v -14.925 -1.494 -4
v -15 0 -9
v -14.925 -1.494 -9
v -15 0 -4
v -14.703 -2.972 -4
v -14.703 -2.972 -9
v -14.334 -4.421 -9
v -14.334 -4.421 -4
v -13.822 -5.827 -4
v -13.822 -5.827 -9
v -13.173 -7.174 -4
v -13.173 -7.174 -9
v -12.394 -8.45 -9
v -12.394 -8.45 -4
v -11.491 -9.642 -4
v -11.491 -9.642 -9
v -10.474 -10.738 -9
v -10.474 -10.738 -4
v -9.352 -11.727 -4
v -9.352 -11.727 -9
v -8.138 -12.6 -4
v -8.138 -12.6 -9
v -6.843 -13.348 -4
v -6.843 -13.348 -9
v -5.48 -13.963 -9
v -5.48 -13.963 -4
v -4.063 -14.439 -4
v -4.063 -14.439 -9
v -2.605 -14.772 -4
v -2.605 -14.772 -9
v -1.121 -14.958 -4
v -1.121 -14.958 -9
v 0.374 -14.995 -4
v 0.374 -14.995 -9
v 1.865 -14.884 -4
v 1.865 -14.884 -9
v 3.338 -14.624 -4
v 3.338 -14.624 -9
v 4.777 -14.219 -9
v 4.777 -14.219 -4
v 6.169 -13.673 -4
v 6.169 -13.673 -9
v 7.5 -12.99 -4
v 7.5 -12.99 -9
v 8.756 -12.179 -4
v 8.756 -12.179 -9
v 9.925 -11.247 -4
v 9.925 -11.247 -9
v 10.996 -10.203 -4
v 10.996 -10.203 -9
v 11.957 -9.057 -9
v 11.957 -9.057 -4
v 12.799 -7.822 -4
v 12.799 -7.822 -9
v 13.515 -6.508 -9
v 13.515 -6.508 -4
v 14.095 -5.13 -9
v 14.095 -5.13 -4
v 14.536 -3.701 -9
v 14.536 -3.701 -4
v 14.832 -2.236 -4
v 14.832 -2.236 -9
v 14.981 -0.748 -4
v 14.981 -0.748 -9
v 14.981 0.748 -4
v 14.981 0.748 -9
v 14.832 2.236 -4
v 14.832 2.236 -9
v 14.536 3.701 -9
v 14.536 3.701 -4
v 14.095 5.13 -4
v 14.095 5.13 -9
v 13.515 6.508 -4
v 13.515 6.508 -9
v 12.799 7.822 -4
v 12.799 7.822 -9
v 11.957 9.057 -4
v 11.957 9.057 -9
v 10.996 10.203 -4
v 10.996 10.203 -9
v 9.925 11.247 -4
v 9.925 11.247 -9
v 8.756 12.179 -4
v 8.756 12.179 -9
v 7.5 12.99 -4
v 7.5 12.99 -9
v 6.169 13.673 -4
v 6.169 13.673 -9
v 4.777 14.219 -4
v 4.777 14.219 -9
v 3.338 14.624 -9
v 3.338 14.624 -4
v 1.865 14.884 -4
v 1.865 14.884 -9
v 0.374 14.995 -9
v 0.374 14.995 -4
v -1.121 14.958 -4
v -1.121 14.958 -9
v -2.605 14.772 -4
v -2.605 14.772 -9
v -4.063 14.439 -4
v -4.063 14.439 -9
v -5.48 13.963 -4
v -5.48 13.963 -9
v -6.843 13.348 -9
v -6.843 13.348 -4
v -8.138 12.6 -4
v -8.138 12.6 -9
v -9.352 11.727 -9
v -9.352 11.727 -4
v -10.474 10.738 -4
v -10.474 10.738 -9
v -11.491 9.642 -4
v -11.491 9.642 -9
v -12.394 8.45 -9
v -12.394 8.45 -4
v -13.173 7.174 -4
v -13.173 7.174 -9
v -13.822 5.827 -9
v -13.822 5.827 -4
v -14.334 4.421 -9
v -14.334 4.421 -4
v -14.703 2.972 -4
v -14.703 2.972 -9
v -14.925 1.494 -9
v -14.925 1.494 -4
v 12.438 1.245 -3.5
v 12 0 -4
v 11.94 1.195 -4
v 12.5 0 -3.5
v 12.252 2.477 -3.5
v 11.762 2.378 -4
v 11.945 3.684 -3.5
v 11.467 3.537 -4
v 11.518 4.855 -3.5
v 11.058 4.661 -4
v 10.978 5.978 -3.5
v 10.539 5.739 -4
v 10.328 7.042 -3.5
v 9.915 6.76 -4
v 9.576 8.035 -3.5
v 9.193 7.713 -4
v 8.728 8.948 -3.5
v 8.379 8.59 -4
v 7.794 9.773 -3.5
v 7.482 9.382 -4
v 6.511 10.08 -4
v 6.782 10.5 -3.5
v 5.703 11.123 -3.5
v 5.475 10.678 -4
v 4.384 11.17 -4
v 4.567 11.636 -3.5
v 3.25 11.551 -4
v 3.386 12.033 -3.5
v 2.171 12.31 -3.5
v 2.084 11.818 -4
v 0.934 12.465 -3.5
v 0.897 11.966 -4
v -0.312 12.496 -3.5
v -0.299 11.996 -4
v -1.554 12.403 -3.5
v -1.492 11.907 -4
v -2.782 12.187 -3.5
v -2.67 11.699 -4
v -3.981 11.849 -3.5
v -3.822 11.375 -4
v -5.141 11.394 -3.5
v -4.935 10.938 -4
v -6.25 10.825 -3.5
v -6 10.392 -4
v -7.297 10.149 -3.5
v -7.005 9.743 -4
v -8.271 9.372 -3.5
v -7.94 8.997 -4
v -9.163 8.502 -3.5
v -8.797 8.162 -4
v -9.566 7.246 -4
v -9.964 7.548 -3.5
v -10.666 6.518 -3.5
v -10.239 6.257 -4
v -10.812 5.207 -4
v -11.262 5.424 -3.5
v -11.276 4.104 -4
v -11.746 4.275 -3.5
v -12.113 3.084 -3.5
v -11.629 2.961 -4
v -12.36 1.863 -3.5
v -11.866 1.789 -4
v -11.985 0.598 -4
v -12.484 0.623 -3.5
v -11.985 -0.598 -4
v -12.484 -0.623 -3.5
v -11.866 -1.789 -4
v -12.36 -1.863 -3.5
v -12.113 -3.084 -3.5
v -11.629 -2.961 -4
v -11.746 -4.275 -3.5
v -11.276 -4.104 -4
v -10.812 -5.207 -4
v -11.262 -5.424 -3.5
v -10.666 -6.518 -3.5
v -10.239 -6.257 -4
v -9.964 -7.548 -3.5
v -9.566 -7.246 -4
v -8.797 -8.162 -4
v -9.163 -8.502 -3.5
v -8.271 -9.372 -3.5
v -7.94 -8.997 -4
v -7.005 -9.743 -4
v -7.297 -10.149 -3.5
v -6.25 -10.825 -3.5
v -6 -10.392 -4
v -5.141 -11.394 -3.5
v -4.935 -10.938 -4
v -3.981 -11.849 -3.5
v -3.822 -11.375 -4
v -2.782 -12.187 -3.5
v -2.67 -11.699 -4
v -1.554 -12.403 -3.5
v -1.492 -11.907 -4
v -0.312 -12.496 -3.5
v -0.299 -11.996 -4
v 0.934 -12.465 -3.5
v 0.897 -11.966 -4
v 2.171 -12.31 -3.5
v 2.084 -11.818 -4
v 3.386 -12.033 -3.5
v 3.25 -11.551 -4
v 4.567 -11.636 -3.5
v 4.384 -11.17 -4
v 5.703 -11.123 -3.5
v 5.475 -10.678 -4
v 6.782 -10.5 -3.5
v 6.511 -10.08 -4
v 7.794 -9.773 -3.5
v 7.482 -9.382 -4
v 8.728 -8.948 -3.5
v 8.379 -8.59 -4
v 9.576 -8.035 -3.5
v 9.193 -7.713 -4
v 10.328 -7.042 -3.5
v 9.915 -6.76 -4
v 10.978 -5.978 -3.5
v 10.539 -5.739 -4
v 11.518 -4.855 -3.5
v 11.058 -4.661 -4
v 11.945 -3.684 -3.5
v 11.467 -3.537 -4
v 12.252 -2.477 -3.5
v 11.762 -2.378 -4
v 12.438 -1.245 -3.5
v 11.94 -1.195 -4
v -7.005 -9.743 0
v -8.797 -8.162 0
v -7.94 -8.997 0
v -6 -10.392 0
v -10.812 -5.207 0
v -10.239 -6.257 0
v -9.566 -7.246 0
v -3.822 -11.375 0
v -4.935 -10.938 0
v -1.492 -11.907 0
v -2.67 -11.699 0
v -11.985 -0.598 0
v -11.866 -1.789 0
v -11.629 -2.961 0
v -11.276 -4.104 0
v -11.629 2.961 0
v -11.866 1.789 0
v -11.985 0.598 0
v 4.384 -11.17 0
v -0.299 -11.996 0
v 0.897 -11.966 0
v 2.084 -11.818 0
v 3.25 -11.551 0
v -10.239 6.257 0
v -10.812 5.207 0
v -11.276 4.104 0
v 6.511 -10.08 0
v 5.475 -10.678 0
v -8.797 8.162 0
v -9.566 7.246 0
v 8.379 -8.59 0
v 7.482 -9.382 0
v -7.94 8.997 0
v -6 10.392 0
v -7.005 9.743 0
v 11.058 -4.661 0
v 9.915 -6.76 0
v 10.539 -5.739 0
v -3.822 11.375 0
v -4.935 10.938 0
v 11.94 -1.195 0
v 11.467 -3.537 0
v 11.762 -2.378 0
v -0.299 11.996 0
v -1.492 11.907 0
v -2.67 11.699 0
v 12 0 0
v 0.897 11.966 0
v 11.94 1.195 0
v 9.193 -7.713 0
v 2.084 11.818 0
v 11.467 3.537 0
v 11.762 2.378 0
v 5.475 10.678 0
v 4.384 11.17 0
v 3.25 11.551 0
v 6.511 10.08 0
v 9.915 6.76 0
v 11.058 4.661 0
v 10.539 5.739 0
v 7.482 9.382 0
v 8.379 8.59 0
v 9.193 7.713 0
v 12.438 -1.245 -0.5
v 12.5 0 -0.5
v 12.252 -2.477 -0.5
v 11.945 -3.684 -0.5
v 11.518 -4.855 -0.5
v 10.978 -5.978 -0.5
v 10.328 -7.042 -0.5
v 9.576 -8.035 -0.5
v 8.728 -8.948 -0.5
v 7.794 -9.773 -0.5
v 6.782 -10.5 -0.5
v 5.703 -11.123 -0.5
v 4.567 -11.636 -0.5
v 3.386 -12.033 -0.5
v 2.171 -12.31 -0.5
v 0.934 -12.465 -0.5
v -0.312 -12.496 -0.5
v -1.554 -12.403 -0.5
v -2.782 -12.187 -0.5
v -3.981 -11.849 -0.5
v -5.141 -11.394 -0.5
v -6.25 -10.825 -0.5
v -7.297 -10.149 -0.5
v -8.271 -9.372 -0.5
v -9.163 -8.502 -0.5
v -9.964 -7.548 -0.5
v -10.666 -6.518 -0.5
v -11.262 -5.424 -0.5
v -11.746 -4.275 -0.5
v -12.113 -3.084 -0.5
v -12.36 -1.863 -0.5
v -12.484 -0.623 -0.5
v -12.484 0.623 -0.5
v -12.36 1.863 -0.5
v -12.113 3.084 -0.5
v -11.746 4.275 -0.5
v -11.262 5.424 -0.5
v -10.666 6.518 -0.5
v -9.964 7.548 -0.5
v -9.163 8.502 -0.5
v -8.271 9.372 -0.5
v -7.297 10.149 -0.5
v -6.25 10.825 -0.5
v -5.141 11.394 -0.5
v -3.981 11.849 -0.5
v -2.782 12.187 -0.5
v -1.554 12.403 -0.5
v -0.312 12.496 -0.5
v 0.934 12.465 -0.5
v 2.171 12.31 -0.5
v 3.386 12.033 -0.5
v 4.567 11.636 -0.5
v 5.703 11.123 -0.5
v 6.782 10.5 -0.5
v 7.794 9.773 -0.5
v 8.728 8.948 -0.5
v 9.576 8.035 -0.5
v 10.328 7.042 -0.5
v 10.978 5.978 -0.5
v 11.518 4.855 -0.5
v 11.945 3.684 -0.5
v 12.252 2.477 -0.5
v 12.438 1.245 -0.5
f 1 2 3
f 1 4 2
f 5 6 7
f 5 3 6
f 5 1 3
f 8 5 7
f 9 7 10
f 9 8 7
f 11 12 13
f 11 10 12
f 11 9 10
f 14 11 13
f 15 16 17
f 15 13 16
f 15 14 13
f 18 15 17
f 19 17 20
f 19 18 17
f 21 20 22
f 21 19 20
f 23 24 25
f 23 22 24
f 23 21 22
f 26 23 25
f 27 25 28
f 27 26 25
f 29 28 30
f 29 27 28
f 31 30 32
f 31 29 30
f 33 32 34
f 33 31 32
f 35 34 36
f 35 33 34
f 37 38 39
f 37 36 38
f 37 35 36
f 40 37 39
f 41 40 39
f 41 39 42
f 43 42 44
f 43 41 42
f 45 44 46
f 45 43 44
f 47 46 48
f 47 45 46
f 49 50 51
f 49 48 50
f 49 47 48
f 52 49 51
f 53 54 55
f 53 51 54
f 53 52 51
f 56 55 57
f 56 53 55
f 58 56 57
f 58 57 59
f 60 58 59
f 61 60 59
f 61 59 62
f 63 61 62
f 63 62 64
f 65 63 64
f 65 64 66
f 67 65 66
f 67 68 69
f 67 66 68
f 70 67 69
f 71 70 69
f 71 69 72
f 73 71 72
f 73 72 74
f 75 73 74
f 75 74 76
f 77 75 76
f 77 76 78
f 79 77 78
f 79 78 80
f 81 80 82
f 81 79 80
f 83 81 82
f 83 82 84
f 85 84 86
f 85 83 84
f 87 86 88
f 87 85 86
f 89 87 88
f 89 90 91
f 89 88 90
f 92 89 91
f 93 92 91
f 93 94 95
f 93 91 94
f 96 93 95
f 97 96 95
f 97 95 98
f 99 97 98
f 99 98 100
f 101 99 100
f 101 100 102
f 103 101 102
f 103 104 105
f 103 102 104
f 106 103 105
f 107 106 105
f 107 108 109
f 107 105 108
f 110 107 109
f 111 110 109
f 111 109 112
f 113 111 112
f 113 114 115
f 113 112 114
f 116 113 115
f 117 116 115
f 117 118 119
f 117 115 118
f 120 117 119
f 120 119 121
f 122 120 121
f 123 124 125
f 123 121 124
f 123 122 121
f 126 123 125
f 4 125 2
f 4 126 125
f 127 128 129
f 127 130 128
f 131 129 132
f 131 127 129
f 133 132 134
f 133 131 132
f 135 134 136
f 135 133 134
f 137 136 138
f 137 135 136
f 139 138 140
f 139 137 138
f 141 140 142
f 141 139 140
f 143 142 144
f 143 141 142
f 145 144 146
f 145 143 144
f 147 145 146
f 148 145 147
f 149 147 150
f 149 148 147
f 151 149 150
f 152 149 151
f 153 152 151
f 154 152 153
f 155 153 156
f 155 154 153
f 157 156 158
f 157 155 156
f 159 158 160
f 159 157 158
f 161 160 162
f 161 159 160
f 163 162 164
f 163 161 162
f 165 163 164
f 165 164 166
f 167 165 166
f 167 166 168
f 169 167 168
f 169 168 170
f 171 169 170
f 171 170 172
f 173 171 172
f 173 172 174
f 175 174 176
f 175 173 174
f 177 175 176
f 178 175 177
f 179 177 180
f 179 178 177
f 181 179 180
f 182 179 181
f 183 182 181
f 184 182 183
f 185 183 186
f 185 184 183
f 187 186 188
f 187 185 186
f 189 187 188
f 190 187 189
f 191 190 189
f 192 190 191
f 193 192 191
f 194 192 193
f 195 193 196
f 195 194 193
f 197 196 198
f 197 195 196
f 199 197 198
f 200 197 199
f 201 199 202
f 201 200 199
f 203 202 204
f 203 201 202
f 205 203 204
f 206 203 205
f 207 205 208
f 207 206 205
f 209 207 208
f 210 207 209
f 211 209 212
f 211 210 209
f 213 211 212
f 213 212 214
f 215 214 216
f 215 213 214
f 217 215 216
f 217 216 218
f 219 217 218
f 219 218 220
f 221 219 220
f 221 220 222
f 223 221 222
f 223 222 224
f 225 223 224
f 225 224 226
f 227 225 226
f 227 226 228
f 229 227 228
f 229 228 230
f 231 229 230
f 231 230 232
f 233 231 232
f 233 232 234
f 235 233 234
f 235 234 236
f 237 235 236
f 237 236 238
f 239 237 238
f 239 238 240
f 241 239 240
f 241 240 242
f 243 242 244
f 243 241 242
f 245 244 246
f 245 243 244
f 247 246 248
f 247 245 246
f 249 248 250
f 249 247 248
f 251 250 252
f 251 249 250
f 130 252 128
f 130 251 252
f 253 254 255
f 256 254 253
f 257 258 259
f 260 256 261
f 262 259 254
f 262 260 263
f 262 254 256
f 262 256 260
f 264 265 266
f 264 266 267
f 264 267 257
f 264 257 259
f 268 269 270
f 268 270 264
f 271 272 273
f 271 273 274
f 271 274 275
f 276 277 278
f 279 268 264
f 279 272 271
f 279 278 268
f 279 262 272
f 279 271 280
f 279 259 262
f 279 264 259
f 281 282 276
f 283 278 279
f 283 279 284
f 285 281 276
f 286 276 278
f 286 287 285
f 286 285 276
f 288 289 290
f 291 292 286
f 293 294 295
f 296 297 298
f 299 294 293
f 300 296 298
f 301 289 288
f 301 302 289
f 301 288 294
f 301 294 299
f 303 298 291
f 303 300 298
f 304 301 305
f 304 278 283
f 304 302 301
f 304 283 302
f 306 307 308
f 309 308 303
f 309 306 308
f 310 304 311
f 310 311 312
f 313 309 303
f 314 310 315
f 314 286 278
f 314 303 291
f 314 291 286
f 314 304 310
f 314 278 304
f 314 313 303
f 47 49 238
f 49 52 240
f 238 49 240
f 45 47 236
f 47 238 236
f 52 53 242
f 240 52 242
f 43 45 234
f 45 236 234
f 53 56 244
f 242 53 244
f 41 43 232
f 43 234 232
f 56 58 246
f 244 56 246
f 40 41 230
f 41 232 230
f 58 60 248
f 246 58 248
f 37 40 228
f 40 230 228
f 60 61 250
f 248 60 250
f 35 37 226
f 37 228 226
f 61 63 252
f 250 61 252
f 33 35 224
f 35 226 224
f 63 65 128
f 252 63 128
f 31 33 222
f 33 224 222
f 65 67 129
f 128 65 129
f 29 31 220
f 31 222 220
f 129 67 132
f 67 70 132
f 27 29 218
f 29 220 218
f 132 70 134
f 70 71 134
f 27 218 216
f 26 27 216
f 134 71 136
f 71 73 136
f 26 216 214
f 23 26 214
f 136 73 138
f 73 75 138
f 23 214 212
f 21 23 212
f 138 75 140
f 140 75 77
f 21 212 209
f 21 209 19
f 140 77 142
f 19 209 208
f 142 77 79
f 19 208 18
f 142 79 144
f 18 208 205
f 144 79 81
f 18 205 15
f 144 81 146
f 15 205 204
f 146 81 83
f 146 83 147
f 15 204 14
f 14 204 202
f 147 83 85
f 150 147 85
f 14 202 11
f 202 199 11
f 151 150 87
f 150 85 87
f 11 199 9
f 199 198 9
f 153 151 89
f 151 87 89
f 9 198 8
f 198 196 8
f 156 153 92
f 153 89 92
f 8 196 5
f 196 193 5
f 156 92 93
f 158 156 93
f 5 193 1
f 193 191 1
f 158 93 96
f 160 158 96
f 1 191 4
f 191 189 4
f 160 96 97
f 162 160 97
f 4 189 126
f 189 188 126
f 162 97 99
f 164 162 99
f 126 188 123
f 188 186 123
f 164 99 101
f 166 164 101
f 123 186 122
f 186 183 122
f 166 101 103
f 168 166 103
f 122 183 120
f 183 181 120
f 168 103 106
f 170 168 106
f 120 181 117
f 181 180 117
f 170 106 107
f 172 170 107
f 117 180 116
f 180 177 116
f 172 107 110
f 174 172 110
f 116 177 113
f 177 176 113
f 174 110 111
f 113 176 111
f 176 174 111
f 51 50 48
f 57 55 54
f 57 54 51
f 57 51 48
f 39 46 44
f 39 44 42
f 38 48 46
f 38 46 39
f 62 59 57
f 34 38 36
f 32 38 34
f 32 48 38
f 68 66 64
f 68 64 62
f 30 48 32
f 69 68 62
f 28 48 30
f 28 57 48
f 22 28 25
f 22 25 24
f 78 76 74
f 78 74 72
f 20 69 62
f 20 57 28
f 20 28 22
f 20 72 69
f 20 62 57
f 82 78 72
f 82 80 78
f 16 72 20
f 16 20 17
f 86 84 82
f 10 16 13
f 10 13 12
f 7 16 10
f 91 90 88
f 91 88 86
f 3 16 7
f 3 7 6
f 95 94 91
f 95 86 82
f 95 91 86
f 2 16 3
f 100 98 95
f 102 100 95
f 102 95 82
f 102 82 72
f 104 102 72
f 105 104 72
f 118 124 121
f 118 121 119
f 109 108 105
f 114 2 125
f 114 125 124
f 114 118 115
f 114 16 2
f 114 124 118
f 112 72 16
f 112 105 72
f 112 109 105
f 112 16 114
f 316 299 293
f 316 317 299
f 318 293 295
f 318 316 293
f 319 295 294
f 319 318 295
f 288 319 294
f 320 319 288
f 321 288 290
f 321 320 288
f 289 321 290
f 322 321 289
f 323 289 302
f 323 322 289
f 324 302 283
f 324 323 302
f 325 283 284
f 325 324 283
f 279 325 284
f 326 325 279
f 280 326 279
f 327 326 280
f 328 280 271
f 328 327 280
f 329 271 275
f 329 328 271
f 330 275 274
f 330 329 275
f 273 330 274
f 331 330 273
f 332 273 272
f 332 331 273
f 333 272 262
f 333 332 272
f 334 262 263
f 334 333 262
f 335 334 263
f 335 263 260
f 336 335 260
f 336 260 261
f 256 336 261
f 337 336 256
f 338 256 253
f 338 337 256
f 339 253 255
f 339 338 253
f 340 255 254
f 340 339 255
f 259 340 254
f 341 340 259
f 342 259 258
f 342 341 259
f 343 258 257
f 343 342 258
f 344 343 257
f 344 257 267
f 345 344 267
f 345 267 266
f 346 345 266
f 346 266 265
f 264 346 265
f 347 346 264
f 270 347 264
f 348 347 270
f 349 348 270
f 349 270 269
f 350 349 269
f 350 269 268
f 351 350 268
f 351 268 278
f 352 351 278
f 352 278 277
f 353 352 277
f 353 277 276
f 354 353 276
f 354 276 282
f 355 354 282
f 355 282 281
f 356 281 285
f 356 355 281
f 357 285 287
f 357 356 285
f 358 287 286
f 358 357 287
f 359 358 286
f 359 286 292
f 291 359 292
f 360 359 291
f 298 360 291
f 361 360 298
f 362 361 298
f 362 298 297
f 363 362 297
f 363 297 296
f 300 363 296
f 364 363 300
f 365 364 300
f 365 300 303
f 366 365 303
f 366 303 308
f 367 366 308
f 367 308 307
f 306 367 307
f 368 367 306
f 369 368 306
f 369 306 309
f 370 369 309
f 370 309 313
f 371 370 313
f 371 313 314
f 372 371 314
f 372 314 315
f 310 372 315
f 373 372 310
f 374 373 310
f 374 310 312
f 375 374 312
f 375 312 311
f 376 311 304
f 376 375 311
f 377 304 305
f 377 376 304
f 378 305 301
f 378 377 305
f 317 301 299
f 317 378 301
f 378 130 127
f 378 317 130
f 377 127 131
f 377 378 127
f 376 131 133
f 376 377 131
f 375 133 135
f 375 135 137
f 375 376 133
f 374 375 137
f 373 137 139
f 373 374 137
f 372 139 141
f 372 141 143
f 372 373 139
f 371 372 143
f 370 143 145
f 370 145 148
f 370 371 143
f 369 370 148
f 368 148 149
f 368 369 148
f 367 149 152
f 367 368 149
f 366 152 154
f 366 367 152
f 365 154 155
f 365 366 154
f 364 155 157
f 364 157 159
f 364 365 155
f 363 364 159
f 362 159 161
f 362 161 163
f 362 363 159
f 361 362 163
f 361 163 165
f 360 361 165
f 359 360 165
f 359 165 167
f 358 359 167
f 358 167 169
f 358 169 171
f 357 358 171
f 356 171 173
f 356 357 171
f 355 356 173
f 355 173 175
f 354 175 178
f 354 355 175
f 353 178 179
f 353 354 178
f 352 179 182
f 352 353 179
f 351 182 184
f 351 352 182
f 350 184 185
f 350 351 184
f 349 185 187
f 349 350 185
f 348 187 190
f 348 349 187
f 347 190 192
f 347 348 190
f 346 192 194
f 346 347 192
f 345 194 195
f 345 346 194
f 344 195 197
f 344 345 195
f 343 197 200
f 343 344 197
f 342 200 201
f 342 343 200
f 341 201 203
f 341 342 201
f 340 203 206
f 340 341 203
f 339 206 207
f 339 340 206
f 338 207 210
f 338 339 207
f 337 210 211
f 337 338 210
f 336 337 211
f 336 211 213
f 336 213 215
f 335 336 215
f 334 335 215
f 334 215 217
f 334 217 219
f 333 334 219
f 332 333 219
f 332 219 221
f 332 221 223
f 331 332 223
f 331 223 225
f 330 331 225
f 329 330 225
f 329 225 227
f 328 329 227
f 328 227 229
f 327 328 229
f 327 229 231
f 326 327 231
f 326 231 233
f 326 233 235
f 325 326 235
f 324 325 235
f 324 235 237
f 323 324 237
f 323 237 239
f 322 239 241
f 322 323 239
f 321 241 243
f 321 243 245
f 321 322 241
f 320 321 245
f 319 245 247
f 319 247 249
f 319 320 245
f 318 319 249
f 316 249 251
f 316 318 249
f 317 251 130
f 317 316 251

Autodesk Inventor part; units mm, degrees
ref_plane "YZ Plane" through (0, 0, 0) normal (1, 0, 0) x (0, 1, 0)
ref_plane "XZ Plane" through (0, 0, 0) normal (0, 1, 0) x (-1, 0, 0)
ref_plane "XY Plane" through (0, 0, 0) normal (0, 0, 1) x (1, 0, 0)
sketch "Sketch3" plane through (0, 0, 0) normal (0, 0, 1) x (1, 0, 0)
  circle A0 centre (0, 0) radius 12.5
  dimension "d9" = 25
extrude "Extrusion3" add sketch "Sketch3" against normal blind 4
chamfer "Chamfer2" distance 0.5 angle 45 2 edges at (-12.5, 0, 0) (-12.5, 0, -4)
sketch "Sketch4" plane through (0, 0, -4) normal (0, 0, -1) x (-1, 0, 0)
  circle A0 centre (0, 0) radius 15
  dimension "d15" = 30
extrude "Extrusion4" add sketch "Sketch4" along normal blind 5
properties part number "Mirror"
